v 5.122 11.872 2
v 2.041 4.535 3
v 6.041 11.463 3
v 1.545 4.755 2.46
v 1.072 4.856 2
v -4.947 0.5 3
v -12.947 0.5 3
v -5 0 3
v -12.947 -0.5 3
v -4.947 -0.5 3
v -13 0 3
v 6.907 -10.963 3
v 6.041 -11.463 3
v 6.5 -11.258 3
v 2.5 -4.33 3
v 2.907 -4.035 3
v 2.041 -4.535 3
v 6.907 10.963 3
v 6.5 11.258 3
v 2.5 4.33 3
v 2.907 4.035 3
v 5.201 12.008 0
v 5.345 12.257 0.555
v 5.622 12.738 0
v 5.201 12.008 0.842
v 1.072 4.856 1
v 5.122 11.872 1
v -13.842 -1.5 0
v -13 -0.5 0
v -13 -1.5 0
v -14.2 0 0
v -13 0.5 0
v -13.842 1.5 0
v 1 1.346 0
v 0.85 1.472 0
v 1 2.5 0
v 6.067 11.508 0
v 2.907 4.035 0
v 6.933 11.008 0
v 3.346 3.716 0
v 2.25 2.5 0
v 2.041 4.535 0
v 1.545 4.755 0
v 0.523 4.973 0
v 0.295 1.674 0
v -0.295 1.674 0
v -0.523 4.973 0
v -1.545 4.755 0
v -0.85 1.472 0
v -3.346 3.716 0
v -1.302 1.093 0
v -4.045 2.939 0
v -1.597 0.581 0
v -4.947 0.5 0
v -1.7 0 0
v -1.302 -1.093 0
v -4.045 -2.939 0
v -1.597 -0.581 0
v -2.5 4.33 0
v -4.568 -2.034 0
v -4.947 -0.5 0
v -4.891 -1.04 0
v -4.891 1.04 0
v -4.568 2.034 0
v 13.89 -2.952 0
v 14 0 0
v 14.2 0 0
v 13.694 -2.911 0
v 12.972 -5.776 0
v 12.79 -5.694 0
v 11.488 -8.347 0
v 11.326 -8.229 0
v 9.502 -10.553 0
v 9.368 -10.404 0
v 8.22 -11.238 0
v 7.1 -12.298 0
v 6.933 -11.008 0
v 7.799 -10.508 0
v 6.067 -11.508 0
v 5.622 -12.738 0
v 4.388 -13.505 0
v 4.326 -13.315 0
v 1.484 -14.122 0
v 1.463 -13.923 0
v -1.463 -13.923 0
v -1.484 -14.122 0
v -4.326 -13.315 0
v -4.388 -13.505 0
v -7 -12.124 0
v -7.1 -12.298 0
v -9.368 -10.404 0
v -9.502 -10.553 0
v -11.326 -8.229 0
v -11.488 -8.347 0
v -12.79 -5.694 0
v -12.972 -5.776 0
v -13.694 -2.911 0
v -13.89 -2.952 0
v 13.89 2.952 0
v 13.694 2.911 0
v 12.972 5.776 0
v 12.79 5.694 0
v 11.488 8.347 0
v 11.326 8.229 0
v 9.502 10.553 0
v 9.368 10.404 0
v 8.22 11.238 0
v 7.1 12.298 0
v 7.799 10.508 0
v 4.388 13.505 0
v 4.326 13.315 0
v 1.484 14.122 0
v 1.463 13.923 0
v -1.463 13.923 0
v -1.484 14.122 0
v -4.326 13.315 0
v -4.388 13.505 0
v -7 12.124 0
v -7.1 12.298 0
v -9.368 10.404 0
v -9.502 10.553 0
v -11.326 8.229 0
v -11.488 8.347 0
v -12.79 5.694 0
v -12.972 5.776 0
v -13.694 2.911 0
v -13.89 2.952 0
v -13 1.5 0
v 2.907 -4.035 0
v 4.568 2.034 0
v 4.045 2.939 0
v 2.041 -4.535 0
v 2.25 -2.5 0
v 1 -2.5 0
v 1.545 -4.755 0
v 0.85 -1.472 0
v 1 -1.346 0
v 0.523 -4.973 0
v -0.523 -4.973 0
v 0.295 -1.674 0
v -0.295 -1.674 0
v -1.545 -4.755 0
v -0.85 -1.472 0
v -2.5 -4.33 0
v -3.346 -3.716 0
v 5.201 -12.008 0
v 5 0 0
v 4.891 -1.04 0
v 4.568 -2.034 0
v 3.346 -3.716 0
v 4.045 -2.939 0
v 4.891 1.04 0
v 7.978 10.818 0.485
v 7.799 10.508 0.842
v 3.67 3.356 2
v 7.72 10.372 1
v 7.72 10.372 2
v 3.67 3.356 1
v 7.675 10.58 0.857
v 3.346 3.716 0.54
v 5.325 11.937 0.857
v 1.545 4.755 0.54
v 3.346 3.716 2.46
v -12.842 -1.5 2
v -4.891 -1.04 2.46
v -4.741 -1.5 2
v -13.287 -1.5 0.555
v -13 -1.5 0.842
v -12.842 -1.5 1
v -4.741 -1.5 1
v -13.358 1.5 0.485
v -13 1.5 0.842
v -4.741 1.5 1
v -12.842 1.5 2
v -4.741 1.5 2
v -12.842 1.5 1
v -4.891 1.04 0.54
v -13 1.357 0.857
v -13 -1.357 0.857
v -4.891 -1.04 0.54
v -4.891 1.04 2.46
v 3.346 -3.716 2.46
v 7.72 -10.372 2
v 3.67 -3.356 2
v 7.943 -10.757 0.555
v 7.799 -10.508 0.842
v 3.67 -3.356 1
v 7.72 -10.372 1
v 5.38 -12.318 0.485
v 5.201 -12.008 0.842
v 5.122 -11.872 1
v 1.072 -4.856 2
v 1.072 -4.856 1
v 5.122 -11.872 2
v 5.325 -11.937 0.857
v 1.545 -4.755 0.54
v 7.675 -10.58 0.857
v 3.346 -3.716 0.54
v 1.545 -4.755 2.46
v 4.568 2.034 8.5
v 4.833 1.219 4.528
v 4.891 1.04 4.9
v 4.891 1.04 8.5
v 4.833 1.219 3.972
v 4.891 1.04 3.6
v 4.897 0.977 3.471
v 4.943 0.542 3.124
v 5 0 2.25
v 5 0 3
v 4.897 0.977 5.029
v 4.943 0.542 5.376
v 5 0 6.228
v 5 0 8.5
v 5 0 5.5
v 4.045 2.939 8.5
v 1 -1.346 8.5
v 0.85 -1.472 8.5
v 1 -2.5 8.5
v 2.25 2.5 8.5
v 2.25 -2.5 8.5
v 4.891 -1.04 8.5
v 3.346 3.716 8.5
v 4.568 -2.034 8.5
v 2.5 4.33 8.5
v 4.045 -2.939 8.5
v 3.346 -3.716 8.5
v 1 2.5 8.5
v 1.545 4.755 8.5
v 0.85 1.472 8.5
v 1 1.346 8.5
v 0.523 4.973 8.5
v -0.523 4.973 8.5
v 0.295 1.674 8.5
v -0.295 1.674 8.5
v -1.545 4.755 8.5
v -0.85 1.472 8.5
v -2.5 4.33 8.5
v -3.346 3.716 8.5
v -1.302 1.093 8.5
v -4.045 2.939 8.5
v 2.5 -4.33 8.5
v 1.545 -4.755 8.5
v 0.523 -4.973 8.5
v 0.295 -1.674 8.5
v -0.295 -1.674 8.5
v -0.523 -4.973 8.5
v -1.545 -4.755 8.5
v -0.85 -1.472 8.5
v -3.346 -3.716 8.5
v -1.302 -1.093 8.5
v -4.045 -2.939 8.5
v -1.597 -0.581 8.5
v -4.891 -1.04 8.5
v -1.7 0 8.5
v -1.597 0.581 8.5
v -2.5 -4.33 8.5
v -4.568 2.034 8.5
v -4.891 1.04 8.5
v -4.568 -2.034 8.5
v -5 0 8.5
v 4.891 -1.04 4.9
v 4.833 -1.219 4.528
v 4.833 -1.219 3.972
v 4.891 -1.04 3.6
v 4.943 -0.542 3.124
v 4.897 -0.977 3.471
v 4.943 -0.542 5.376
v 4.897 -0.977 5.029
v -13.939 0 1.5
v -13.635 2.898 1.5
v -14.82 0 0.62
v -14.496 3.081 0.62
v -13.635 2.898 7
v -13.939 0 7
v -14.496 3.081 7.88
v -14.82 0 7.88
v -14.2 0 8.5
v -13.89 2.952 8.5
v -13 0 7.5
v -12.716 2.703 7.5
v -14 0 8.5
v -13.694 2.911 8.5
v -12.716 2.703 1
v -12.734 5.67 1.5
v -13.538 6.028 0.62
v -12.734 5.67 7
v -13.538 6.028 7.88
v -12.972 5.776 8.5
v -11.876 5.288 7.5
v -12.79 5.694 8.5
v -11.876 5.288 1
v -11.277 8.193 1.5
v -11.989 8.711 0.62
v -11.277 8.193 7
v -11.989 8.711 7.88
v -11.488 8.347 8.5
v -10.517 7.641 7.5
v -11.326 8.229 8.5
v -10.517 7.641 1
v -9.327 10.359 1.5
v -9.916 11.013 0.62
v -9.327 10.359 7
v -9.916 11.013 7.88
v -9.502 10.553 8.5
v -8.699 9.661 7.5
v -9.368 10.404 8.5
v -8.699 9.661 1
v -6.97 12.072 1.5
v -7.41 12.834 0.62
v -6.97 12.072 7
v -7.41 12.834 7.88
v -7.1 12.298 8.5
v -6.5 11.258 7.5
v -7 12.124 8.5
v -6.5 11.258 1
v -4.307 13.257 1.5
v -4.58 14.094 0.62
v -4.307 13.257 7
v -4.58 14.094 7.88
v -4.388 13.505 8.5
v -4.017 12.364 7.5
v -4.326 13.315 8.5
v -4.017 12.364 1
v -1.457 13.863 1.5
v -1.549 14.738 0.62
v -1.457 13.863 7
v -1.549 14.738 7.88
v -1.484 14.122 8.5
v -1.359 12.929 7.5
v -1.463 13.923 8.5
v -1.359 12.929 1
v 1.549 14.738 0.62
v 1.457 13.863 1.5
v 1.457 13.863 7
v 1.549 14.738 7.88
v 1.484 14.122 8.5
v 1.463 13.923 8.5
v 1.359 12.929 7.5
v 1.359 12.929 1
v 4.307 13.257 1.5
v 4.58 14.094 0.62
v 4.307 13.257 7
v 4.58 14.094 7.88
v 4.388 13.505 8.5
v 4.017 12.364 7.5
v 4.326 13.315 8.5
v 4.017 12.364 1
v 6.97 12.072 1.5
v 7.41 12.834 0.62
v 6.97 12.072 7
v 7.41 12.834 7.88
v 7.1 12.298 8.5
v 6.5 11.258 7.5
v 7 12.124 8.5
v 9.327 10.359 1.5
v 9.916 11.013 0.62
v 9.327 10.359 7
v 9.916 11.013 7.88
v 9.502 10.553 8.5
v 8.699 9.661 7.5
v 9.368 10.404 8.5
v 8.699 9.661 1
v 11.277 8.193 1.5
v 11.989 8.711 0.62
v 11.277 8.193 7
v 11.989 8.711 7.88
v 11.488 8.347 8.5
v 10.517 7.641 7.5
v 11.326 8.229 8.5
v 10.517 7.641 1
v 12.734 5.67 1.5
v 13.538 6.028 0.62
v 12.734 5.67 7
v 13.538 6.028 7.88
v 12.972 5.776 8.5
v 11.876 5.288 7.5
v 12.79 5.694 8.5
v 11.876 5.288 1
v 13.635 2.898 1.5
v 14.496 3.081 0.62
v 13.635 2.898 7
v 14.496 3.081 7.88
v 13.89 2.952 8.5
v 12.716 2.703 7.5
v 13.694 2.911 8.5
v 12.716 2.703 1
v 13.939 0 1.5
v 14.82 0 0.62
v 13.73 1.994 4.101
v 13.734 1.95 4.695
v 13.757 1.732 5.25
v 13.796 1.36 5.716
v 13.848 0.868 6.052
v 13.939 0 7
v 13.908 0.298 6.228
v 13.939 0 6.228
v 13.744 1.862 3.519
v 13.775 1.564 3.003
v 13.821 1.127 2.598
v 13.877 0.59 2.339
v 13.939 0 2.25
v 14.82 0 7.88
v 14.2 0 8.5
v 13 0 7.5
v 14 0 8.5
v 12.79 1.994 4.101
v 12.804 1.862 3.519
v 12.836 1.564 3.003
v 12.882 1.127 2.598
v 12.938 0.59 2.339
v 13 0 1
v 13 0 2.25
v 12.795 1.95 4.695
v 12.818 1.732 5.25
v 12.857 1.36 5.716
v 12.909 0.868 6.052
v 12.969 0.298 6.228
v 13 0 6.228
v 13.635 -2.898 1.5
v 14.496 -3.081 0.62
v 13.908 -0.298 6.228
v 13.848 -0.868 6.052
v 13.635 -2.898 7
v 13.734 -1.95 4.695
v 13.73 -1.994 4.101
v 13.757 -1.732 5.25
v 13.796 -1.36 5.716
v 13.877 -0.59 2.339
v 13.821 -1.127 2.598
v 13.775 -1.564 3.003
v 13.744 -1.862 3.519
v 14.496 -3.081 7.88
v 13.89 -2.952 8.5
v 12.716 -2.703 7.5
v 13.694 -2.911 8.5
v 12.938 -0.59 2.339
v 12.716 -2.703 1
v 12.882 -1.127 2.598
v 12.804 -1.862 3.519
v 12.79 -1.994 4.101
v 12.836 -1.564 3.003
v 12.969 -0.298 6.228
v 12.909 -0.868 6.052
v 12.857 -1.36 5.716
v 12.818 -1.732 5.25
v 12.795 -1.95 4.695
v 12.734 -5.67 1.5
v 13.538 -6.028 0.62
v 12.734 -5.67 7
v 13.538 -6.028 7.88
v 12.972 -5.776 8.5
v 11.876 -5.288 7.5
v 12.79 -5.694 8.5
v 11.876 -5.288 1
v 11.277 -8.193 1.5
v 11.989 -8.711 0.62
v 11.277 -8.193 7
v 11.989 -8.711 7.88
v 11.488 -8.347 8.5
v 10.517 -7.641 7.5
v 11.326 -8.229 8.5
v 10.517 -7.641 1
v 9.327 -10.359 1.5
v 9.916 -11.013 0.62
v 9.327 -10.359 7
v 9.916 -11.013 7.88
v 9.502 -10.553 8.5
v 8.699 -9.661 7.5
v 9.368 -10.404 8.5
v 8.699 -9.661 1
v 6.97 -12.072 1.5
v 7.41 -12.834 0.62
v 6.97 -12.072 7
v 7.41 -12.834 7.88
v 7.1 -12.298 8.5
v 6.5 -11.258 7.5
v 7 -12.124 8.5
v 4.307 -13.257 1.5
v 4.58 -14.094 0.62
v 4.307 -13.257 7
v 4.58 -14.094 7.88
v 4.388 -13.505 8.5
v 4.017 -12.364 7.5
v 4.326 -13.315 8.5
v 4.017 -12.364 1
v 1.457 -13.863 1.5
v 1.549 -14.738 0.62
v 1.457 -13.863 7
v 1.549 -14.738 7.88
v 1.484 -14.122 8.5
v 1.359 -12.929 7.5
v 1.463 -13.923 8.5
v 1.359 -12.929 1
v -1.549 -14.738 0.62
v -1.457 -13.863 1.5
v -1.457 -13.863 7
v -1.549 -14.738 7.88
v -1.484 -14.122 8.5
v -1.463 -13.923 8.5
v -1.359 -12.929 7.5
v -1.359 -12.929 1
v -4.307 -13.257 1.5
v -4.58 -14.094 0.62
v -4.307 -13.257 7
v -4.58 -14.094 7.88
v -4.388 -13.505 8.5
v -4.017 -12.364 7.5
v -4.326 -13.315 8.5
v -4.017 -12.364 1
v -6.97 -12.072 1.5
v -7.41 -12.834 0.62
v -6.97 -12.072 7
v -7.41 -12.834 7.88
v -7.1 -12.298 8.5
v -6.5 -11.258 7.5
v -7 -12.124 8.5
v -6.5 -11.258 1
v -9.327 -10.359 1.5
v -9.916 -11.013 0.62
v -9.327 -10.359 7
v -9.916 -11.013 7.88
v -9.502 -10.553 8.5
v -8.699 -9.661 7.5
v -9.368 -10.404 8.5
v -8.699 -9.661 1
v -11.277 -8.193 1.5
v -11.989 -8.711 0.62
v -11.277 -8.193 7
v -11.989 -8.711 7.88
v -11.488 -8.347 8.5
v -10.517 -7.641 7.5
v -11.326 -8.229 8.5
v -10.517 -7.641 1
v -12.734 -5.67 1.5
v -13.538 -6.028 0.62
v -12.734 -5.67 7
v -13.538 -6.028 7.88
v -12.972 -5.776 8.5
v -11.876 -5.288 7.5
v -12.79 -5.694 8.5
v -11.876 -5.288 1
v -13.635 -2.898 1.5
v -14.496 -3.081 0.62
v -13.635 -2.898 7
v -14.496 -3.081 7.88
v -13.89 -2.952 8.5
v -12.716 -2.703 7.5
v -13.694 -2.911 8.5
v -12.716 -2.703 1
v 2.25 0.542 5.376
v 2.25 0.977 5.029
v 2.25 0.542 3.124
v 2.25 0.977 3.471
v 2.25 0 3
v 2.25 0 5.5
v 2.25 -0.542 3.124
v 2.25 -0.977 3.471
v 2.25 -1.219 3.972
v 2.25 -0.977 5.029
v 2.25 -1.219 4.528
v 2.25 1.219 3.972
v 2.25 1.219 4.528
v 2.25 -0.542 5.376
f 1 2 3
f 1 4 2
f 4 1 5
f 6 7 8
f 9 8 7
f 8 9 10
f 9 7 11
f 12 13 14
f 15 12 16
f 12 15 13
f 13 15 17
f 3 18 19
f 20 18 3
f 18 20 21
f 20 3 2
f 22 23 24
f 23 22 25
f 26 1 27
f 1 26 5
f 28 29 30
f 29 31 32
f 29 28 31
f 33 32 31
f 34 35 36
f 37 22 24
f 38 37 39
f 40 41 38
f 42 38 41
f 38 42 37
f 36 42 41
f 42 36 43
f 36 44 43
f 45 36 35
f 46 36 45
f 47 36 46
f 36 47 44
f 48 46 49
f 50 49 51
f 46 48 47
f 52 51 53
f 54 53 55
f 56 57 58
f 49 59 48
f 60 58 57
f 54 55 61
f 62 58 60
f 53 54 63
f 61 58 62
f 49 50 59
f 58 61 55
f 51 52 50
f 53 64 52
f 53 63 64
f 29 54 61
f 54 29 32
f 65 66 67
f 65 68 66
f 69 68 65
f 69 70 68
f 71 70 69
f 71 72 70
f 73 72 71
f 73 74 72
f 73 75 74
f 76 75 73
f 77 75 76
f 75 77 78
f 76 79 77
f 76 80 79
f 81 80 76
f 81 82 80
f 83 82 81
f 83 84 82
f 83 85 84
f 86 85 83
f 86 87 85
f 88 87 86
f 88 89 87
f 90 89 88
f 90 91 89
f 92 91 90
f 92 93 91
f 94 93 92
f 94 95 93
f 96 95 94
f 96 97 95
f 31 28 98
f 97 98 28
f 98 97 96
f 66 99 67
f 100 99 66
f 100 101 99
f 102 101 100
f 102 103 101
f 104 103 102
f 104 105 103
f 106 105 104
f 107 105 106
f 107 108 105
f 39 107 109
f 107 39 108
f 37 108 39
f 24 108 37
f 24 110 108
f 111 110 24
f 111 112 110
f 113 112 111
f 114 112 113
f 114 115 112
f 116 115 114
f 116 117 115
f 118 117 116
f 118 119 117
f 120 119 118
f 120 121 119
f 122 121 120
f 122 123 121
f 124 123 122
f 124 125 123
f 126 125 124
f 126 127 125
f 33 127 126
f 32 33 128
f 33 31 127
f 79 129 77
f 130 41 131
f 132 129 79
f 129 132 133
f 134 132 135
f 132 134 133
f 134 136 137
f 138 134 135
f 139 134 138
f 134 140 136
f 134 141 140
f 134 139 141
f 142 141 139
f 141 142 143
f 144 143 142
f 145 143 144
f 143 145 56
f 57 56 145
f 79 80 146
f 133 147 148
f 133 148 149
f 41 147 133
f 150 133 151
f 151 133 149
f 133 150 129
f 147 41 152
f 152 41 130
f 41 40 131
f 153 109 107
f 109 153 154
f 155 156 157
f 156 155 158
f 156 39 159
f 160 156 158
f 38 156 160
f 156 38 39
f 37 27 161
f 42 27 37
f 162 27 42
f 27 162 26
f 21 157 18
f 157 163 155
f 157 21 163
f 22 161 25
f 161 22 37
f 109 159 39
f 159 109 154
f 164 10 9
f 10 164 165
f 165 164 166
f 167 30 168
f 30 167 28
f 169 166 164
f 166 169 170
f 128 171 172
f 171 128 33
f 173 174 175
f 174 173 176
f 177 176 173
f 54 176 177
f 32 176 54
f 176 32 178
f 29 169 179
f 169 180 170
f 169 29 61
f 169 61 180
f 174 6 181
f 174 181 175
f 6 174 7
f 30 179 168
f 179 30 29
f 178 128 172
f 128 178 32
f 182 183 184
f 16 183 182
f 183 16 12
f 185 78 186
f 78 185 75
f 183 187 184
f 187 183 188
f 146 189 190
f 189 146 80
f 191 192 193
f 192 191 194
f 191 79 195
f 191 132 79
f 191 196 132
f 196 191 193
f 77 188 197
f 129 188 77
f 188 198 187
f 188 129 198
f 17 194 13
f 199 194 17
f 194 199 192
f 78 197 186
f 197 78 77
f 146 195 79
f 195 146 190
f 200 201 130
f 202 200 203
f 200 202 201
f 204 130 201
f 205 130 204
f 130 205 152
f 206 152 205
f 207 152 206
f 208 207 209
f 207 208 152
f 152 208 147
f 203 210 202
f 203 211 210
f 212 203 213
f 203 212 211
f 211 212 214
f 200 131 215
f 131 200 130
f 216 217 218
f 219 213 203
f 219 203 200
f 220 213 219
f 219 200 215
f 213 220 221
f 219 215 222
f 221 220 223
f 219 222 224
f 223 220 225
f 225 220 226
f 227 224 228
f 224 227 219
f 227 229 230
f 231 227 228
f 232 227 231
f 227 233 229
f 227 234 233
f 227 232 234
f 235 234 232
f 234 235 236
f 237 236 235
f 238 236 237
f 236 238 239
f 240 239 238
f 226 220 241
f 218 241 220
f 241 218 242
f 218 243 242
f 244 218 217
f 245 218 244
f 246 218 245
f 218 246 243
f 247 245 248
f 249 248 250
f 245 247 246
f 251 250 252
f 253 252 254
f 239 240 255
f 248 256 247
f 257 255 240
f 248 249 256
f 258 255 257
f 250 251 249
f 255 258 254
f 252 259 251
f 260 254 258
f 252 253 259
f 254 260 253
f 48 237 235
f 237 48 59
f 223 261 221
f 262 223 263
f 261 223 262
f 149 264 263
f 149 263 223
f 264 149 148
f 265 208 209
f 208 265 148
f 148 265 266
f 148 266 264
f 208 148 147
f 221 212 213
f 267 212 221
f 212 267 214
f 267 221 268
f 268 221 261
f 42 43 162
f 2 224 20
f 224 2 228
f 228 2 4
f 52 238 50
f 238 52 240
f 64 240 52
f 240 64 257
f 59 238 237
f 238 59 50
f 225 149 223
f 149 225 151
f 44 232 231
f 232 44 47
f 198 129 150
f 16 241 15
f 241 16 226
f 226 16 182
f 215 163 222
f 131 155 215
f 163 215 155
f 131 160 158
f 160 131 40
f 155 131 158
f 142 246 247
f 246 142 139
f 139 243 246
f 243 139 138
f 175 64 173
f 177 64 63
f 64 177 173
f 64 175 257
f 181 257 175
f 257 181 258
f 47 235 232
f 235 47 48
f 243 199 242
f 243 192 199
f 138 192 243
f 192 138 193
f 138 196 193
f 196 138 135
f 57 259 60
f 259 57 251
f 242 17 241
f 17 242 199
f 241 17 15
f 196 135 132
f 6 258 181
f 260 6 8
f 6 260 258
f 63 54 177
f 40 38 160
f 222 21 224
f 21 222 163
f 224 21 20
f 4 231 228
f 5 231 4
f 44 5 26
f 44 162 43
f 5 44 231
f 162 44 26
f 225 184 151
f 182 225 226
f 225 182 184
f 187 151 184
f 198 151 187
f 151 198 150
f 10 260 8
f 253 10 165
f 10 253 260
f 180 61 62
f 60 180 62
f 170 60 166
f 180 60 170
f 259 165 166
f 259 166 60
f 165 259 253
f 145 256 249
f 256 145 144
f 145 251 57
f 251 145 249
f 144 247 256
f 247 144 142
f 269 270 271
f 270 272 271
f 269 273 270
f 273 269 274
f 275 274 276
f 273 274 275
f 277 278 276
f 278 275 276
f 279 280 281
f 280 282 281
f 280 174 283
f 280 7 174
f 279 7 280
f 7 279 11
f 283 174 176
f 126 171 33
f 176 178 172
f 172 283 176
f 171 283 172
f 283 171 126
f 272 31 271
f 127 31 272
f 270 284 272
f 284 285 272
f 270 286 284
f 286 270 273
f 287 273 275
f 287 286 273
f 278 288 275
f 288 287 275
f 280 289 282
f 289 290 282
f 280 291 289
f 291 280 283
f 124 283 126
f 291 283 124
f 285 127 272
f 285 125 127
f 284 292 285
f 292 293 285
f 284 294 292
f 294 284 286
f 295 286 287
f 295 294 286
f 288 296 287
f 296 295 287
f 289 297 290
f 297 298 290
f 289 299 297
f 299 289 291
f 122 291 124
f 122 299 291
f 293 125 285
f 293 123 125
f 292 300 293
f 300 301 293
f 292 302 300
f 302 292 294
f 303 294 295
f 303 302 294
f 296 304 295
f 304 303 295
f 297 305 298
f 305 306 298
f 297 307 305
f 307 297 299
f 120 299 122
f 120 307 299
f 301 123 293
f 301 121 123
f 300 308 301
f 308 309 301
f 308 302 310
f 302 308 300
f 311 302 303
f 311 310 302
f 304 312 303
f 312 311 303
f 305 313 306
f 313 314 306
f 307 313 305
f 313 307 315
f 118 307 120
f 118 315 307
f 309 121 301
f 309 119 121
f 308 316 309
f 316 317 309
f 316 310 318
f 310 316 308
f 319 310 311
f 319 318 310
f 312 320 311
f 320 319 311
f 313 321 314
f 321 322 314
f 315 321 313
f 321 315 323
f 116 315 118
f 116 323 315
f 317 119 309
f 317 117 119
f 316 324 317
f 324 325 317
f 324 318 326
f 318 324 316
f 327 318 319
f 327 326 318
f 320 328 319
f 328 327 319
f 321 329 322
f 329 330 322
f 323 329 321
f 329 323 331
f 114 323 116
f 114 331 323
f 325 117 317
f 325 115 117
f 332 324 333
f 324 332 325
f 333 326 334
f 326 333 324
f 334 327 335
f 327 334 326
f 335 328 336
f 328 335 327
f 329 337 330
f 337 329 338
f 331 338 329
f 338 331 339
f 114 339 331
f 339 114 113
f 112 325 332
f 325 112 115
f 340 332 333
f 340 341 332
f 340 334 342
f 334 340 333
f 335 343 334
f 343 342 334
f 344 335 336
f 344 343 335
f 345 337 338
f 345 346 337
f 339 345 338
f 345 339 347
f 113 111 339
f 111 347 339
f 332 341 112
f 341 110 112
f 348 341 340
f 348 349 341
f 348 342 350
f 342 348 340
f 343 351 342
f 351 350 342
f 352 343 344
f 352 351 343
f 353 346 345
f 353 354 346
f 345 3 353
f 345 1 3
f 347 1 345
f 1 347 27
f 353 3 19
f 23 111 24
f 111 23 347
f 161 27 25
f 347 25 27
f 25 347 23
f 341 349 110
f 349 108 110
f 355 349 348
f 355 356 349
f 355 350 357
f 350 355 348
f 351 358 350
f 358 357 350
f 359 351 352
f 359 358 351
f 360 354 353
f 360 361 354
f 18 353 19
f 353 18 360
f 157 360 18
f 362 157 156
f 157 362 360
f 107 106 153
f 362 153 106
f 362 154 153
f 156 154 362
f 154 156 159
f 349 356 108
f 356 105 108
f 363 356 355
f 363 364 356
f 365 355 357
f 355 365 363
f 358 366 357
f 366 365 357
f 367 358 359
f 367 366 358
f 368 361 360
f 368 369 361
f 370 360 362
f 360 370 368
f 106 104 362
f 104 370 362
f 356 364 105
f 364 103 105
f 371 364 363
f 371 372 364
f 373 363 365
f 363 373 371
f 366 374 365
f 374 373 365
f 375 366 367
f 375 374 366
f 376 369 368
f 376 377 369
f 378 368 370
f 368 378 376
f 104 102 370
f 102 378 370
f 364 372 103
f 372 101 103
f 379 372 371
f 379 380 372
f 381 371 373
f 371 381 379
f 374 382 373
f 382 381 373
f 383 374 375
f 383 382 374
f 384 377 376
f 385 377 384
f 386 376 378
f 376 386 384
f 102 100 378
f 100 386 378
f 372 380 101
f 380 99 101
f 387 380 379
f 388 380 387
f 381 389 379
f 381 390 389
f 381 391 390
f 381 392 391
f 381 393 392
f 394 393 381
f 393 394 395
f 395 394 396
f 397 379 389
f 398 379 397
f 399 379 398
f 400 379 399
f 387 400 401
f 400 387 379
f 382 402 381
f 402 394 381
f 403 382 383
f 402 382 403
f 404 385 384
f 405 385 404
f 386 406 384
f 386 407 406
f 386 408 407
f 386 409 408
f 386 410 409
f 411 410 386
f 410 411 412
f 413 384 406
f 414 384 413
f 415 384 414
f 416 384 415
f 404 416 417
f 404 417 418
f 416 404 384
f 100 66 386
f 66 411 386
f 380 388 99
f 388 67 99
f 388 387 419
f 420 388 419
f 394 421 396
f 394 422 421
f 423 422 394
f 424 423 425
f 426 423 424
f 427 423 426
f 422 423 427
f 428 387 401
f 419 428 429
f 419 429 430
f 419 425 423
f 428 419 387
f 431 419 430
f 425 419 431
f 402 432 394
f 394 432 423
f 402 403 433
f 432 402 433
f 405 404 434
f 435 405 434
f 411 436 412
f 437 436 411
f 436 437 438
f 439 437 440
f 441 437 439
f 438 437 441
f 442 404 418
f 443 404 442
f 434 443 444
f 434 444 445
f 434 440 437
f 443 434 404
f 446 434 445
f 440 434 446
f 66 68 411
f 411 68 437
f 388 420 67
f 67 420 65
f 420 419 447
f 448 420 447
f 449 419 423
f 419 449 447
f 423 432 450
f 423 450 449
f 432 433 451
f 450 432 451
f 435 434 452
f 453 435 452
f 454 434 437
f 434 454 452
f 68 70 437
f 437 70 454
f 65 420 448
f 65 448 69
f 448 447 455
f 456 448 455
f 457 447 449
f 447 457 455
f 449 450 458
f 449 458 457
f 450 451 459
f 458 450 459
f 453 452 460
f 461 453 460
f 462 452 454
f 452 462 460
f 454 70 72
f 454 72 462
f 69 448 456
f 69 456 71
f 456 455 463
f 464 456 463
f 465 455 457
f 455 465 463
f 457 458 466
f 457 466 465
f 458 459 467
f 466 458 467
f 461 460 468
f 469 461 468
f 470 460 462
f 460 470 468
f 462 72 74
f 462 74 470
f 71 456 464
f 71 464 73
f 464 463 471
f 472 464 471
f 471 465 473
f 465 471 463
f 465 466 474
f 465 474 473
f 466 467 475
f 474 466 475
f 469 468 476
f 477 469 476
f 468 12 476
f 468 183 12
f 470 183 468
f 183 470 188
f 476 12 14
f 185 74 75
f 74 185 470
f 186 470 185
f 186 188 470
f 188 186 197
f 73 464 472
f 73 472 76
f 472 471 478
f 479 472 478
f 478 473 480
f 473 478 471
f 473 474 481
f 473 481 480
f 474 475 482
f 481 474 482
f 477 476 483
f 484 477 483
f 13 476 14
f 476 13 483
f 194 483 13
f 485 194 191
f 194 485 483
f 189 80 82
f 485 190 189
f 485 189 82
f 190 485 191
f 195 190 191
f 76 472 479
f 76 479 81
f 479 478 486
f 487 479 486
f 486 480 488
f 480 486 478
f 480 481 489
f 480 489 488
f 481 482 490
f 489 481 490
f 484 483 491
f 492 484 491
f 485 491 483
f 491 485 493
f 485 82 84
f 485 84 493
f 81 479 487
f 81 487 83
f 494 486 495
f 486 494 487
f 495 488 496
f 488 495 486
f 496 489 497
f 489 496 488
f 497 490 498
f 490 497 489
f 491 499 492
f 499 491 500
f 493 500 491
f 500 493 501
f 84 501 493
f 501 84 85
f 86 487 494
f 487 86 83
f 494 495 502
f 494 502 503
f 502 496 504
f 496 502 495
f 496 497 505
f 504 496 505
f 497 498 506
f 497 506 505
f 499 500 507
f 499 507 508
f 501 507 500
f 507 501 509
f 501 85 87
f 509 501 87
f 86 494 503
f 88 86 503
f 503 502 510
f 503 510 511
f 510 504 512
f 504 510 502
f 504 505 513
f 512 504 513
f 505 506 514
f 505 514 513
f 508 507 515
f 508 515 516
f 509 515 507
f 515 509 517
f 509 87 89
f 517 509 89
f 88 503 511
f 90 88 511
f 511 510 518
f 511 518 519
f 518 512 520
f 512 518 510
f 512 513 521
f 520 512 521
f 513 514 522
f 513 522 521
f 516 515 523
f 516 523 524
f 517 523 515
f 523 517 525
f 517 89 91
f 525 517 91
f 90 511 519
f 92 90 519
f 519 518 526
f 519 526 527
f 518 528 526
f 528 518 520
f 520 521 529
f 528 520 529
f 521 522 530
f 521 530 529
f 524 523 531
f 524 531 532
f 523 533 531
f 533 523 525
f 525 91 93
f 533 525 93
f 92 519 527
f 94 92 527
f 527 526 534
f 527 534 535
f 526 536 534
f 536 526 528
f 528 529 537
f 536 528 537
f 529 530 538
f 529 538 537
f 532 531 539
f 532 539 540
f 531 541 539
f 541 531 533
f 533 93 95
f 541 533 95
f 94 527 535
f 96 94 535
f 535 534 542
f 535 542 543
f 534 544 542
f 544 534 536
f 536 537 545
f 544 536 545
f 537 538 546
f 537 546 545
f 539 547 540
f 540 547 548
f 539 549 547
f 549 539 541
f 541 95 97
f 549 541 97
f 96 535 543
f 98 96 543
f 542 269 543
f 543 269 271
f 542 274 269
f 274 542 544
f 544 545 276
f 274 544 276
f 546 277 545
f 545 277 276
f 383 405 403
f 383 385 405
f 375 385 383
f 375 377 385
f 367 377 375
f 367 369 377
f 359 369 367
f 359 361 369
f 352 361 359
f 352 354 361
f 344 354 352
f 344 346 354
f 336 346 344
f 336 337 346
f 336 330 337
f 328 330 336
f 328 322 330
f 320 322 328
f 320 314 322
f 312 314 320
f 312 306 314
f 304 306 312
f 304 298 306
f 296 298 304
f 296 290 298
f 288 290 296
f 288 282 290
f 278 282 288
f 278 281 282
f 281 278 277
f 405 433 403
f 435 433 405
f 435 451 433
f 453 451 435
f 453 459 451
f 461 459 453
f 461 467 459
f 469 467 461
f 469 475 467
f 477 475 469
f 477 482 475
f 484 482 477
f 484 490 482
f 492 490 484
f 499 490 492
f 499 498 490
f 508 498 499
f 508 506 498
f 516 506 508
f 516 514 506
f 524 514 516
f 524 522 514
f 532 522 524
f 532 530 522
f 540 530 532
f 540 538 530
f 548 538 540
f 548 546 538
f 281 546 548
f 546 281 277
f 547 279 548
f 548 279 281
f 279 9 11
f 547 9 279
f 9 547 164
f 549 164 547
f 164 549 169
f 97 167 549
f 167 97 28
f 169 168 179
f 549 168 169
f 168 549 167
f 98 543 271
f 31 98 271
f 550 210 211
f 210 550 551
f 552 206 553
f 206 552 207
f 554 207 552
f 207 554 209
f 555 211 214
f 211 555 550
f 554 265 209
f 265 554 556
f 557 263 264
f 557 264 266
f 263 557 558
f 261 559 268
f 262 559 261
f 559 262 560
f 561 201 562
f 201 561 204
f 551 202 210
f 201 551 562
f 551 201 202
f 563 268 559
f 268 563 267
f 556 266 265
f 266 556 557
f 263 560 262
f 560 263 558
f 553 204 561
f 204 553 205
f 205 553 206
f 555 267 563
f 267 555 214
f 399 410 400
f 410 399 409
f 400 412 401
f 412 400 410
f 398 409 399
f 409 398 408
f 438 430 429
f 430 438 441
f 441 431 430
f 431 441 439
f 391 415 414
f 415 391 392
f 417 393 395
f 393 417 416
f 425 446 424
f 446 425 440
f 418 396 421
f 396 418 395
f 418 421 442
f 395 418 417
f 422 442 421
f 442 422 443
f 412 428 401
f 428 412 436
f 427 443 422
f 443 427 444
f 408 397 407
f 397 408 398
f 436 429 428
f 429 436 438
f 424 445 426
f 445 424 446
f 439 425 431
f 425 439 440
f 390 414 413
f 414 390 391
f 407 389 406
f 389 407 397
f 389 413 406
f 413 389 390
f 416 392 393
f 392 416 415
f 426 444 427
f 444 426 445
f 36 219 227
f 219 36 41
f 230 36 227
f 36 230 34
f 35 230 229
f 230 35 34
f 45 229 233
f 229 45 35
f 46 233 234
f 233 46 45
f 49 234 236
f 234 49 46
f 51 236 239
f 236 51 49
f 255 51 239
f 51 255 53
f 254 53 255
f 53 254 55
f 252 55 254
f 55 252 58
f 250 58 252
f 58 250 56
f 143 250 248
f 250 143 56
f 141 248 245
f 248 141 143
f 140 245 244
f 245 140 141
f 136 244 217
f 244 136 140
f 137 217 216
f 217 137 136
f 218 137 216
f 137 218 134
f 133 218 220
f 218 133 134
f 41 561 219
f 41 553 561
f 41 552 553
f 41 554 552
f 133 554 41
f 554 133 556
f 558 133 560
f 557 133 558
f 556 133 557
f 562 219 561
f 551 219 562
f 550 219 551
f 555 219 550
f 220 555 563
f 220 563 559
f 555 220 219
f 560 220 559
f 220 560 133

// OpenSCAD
// file: inc/bevel_lib.scad
// Bevelled boxes, etc
module roundedbox(size=[1.0, 1.0, 1.0, ], radius = 0.1) {
    hull() {
        for (x = [radius, size[0] - radius]) {
            for (y = [radius, size[1] - radius]) {
                for (z = [radius, size[2] - radius]) {
                    translate([x,y,z])
                        sphere(r=radius);
                }
            }
        }
    }
}

module rounded_square_centered(size=[1,1], radius=0.1) {
    hull() {
        for (x = [- size[0] / 2 + radius, size[0] / 2 - radius]) {
            for (y = [- size[1] / 2 + radius, size[1] / 2 - radius]) {
                translate([x,y]) circle(radius);
            }
        }
    }
}

// Bevelled in x and y axes.
module bevelledbox(size=[1,1,1], radius=0.1) {
    linear_extrude(height=size[2]) {
        // 8-sided polygon
        polygon(points=[
            // Left
            [0, radius ],
            [0, size[1] - radius ],
            // Top
            [radius, size[1]],
            [size[0] - radius, size[1]],
            // Right
            [size[0], size[1] - radius],
            [size[0], radius],
            // Bot
            [size[0] -radius, 0],
            [radius, 0]
            ]);
    }
}

module bevelledbox_y(size=[1,1,1], radius=0.1) {
    // Bevelled around y
    translate([0,0,size[2]])
        rotate(-90, [1,0,0])
            bevelledbox([size[0], size[2], size[1]], radius); 
}

module bevelledbox_x(size=[1,1,1], radius=0.1) {
    // Bevelled around x
    translate([size[0],0,0])
        rotate(-90, [0,1,0])
            bevelledbox([size[2], size[1], size[0]], radius); 
}

// Draw origin-centred, unit polyhedron.
module octahedron(C0=1.0) {
    polyhedron(points = [
        [0.0, 0.0,  C0],
        [0.0, 0.0, -C0],
        [ C0, 0.0, 0.0],
        [-C0, 0.0, 0.0],
        [0.0,  C0, 0.0],
        [0.0, -C0, 0.0]
        ],
        faces = [
[ 4 , 2, 0],
[ 3 , 4, 0],
[ 5 , 3, 0],
[ 2 , 5, 0],
[ 5 , 2, 1],
[ 3 , 5, 1],
[ 4 , 3, 1],
[ 2 , 4, 1]
        ]
    );
}

module fullybevelledbox(size=[1,1,1], radius=0.1) {
    hull() {
        for (x = [radius, size[0] - radius]) {
            for (y = [radius, size[1] - radius]) {
                for (z = [radius, size[2] - radius]) {
                    translate([x,y,z])
                        octahedron(radius);
                }
            }
        }
    }
}
// main file
// This document uses MILLIMETRES as a unit.

// Set $fs (smallest arc fragment) to lower value than default 2.0
$fs = 0.6; // millimetres

use <inc/bevel_lib.scad>;

// Gearbox is approx 15x10 mm, so needs about 18mm inside
main_diameter = 30;

main_radius = main_diameter / 2;

axle_diameter = 3.0;
axle_radius = axle_diameter / 2;
axle_radius_margin = 0.2; // Extra allowance for shrinkage etc
axle_height = 8.5; // It is nominally 9mm
main_height = 8.5;
base_height = main_height / 2;
main_thickness = 1.8;
tyre_radius = 1.5;
tyre_offset = 2.5; // tyre distance from end

// Cutout for grub screw nut for axle flat:
axle_nut_h = 1.25;
axle_nut_w = 5.0;
grub_screw_radius = 1.25;
// Bigger cutout for screwdriver shaft
driver_radius = 2.0;

/*
 * the direction of the print is:
 * +Z points INTO the motor, which might not be what you expect. 
 */
 

// Unit-diamond 
module diamond(r=1.0)
{
    polygon(points=[ [r,0], [0,r], [-r,0], [0,-r] ]);
}

module bevel_square(size=[10,10], r=1.0)
{
    hull() {
        translate([r,r]) diamond(r);
        translate(size - [r,r]) diamond(r);
        translate([size[0] - r, r]) diamond(r);
        translate([r, size[1] - r]) diamond(r);
    }
}

module spokes()
{
    r = (main_radius - 1.5);
    spoke_width = 3.0;
    bevel = 1.0;
    for(ang = [60,180,300]) {
        rotate([0,0,ang])
        {
            translate([0,- (spoke_width / 2),0]) {
                bevelledbox_x([r, spoke_width, spoke_width], radius = bevel);
            }
            // Small extra piece to ensure continuity with the base
            translate([main_radius - 1.5,0,0.5]) {
                cube([1.0, spoke_width, 1.0], center=true);
            }
        }
    }
}

module wheel_with_insert() 
{
    hub_radius = axle_radius + 3.5;
    difference()
    {
        union()
        {
            // Axle mount
            cylinder(h=axle_height, r=hub_radius);
            
            // Outer part
            rotate_extrude(convexity=3) {
                difference() {
                    
                    union() {
                        // Walls
                        translate([main_radius - main_thickness,0])
                            bevel_square([main_thickness, main_height], r=1);
                        // base
                        // square([main_radius-1, base_height]);
                    };
                    // Tyre cutout
                    translate([main_radius - (tyre_radius / sqrt(2)),0])
                    {
                        bevel_square([tyre_radius * 2, main_height],
                            r=tyre_radius);
                    }
                }
            }
            spokes();
        }
        
        // Cutouts
        union() 
        {
            // Cutout for axle
            translate([0,0,-10]) {
                linear_extrude(height=30.0, convexity=3) {
                    union() {
                        circle(r=axle_radius + axle_radius_margin);
                        translate([1.0 + (axle_nut_h / 2),0])
                            square([axle_nut_h, axle_nut_w], center=true);
                    }
                } // linear
            } // trans
        } // union
        // Cutout for the screw / screwdriver.
        translate([0,0, main_height/2])
        rotate([0,90,0]) {
            cylinder(h=100, r = grub_screw_radius);
            // Cutout for screwdriver:
            // Not needed if we use a hex grub screw.
            translate([0,0, hub_radius])
                cylinder(h=100, r = driver_radius);
            // Cutout for screw head
            // translate([0,0, axle_radius + 4.0])
            //    cylinder(h=6.0, r=2.75);
        }
        
        // Weight-saving cutouts.
        /* union()
        {
            translate([0,0,-10])
            linear_extrude(height=30.0, convexity=3) {
                rotate([0,0,45])
                difference() {
                        circle(r=(main_radius - main_thickness - 0.1) );
                        square([30,4],center=true);
                        square([4,30],center=true);
                        circle(r=hub_radius + 0.1 );
                }
            }
        }
        */
    } // diff
    
    // Non printed
    %translate([0,0,axle_height + 0.5 + 11]) {
        cube([11,9,22], center=true);
    }
}

wheel_with_insert();
